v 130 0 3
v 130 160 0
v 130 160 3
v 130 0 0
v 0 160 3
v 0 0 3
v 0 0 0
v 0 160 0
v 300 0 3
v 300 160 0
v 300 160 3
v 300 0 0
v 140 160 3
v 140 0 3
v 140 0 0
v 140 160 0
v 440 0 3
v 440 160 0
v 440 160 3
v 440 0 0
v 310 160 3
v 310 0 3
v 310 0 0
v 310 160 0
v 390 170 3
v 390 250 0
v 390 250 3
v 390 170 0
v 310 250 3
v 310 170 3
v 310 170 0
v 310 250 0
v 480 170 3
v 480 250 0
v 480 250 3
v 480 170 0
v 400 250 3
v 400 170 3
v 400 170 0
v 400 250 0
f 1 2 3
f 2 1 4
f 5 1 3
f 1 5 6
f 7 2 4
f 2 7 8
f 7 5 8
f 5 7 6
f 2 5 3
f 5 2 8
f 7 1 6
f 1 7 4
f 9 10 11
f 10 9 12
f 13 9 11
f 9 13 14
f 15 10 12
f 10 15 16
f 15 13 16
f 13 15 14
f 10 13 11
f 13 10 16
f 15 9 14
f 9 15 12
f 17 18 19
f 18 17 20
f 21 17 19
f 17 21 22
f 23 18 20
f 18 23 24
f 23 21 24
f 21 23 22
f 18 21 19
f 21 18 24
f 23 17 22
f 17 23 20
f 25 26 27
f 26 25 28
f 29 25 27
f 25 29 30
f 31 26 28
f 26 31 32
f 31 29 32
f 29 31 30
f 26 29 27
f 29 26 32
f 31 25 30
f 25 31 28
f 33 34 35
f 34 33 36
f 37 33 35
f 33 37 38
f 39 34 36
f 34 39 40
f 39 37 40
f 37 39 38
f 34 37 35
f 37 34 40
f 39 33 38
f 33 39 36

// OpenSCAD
$fn = 100;

module avant_pince(){
    difference(){
        cube([50, 250, 3], center = true);
        
        translate([15, -110, 0]) cylinder(h=4, d=3, center = true);
        translate([15, 110, 0]) cylinder(h=4, d=3, center = true);
        translate([5, -110, 0]) cylinder(h=4, d=3, center = true);
        translate([5, 110, 0]) cylinder(h=4, d=3, center = true);
        
        translate([-15, -0, 0]) cube([20, 50, 4], center = true);
    }
}

module pince(){
    difference(){
        cube([60, 250, 3], center = true);
        
        translate([-20, -110, 0]) cylinder(h=4, d=3, center = true);
        translate([-20, 110, 0]) cylinder(h=4, d=3, center = true);
        translate([-10, -110, 0]) cylinder(h=4, d=3, center = true);
        translate([-10, 110, 0]) cylinder(h=4, d=3, center = true);
    }
}

module plaque_arr(){
    difference(){
        cube([158, 300, 3], center =  true);
        
        translate([-44, -110, 0]) cylinder(h=4, d=4, center = true);
        translate([-44, 110, 0]) cylinder(h=4, d=4, center = true);
        
        translate([44, -110, 0]) cylinder(h=4, d=4, center = true);
        translate([44, 110, 0]) cylinder(h=4, d=4, center = true);
    }
}

module plaque_av(){
    difference(){
        cube([270, 300, 3], center = true);
    
        translate([-124, -130, 0]) cylinder(h=4, d=4, center = true);
        translate([-124, 130, 0]) cylinder(h=4, d=4, center = true);
        
        translate([124, -130, 0]) cylinder(h=4, d=4, center = true);
        translate([124, 130, 0]) cylinder(h=4, d=4, center = true);
    }
}

module plaque_cote(){
    difference(){
        cube([164, 300, 3], center = true);
        
        translate([72, -130, 0]) cylinder(h=4, d=3, center = true);
        translate([62, -130, 0]) cylinder(h=4, d=3, center = true);
        translate([72, 130, 0]) cylinder(h=4, d=3, center = true);
        translate([62, 130, 0]) cylinder(h=4, d=3, center = true);
        
        translate([72, -110, 0]) cylinder(h=4, d=4, center = true);
        translate([72, 110, 0]) cylinder(h=4, d=4, center = true);
        
        translate([-71, -110, 0]) cylinder(h=4, d=4, center = true);
        translate([-71, 110, 0]) cylinder(h=4, d=4, center = true);
        
        translate([0, -30, 0]) cube([125, 40, 4], center = true);
    }
}

module plaque_angle(){
    difference(){
        cube([80, 300, 3], center = true);
        
        translate([30, -130, 0]) cylinder(h=4, d=3, center = true);
        translate([20, -130, 0]) cylinder(h=4, d=3, center = true);
        translate([30, 130, 0]) cylinder(h=4, d=3, center = true);
        translate([20, 130, 0]) cylinder(h=4, d=3, center = true);
    }
}


//projection(cut = false)
module plexi1(){
translate([25, 175, 0]) union(){
    avant_pince();
    translate([60, 0, 0]) pince();
    translate([180, -25, 0]) plaque_arr();
    translate([100, 170, 0]) rotate([0, 0, 90]) avant_pince();
    translate([100, 230, 0]) rotate([0, 0, 90]) pince();
    translate([310, -25, 0]) plaque_angle();
}
}

module plexi2(){
    translate([35, 175, 0]) union(){
    translate([400, -25, 0]) plaque_av();
    
    translate([590, -25, 0]) plaque_angle();
    translate([440, 180, 0]) rotate([0, 0, 90]) plaque_angle();
    
    }
}

module plexi3(){
    translate([35, 175, 0]) union(){
        translate([630, -25, 0]) plaque_cote();
    
        translate([450, -25, 0]) plaque_cote();
    }
}


module plexi_cartes(){
    cube([130, 160, 3]);
    translate([140, 0, 0]) cube([160, 160, 3]);
    translate([310, 0, 0]) cube([130, 160, 3]);
    
    translate([310, 170, 0]) cube([80, 80, 3]);
    translate([400, 170, 0]) cube([80, 80, 3]);    
}

% difference(){
    translate([0, 0, -1]) cube([500, 400, 1]);
    translate([0, 170, -1.1]) cube([280, 230, 1.2]);
}
//projection(cut = false) 
plexi_cartes();
